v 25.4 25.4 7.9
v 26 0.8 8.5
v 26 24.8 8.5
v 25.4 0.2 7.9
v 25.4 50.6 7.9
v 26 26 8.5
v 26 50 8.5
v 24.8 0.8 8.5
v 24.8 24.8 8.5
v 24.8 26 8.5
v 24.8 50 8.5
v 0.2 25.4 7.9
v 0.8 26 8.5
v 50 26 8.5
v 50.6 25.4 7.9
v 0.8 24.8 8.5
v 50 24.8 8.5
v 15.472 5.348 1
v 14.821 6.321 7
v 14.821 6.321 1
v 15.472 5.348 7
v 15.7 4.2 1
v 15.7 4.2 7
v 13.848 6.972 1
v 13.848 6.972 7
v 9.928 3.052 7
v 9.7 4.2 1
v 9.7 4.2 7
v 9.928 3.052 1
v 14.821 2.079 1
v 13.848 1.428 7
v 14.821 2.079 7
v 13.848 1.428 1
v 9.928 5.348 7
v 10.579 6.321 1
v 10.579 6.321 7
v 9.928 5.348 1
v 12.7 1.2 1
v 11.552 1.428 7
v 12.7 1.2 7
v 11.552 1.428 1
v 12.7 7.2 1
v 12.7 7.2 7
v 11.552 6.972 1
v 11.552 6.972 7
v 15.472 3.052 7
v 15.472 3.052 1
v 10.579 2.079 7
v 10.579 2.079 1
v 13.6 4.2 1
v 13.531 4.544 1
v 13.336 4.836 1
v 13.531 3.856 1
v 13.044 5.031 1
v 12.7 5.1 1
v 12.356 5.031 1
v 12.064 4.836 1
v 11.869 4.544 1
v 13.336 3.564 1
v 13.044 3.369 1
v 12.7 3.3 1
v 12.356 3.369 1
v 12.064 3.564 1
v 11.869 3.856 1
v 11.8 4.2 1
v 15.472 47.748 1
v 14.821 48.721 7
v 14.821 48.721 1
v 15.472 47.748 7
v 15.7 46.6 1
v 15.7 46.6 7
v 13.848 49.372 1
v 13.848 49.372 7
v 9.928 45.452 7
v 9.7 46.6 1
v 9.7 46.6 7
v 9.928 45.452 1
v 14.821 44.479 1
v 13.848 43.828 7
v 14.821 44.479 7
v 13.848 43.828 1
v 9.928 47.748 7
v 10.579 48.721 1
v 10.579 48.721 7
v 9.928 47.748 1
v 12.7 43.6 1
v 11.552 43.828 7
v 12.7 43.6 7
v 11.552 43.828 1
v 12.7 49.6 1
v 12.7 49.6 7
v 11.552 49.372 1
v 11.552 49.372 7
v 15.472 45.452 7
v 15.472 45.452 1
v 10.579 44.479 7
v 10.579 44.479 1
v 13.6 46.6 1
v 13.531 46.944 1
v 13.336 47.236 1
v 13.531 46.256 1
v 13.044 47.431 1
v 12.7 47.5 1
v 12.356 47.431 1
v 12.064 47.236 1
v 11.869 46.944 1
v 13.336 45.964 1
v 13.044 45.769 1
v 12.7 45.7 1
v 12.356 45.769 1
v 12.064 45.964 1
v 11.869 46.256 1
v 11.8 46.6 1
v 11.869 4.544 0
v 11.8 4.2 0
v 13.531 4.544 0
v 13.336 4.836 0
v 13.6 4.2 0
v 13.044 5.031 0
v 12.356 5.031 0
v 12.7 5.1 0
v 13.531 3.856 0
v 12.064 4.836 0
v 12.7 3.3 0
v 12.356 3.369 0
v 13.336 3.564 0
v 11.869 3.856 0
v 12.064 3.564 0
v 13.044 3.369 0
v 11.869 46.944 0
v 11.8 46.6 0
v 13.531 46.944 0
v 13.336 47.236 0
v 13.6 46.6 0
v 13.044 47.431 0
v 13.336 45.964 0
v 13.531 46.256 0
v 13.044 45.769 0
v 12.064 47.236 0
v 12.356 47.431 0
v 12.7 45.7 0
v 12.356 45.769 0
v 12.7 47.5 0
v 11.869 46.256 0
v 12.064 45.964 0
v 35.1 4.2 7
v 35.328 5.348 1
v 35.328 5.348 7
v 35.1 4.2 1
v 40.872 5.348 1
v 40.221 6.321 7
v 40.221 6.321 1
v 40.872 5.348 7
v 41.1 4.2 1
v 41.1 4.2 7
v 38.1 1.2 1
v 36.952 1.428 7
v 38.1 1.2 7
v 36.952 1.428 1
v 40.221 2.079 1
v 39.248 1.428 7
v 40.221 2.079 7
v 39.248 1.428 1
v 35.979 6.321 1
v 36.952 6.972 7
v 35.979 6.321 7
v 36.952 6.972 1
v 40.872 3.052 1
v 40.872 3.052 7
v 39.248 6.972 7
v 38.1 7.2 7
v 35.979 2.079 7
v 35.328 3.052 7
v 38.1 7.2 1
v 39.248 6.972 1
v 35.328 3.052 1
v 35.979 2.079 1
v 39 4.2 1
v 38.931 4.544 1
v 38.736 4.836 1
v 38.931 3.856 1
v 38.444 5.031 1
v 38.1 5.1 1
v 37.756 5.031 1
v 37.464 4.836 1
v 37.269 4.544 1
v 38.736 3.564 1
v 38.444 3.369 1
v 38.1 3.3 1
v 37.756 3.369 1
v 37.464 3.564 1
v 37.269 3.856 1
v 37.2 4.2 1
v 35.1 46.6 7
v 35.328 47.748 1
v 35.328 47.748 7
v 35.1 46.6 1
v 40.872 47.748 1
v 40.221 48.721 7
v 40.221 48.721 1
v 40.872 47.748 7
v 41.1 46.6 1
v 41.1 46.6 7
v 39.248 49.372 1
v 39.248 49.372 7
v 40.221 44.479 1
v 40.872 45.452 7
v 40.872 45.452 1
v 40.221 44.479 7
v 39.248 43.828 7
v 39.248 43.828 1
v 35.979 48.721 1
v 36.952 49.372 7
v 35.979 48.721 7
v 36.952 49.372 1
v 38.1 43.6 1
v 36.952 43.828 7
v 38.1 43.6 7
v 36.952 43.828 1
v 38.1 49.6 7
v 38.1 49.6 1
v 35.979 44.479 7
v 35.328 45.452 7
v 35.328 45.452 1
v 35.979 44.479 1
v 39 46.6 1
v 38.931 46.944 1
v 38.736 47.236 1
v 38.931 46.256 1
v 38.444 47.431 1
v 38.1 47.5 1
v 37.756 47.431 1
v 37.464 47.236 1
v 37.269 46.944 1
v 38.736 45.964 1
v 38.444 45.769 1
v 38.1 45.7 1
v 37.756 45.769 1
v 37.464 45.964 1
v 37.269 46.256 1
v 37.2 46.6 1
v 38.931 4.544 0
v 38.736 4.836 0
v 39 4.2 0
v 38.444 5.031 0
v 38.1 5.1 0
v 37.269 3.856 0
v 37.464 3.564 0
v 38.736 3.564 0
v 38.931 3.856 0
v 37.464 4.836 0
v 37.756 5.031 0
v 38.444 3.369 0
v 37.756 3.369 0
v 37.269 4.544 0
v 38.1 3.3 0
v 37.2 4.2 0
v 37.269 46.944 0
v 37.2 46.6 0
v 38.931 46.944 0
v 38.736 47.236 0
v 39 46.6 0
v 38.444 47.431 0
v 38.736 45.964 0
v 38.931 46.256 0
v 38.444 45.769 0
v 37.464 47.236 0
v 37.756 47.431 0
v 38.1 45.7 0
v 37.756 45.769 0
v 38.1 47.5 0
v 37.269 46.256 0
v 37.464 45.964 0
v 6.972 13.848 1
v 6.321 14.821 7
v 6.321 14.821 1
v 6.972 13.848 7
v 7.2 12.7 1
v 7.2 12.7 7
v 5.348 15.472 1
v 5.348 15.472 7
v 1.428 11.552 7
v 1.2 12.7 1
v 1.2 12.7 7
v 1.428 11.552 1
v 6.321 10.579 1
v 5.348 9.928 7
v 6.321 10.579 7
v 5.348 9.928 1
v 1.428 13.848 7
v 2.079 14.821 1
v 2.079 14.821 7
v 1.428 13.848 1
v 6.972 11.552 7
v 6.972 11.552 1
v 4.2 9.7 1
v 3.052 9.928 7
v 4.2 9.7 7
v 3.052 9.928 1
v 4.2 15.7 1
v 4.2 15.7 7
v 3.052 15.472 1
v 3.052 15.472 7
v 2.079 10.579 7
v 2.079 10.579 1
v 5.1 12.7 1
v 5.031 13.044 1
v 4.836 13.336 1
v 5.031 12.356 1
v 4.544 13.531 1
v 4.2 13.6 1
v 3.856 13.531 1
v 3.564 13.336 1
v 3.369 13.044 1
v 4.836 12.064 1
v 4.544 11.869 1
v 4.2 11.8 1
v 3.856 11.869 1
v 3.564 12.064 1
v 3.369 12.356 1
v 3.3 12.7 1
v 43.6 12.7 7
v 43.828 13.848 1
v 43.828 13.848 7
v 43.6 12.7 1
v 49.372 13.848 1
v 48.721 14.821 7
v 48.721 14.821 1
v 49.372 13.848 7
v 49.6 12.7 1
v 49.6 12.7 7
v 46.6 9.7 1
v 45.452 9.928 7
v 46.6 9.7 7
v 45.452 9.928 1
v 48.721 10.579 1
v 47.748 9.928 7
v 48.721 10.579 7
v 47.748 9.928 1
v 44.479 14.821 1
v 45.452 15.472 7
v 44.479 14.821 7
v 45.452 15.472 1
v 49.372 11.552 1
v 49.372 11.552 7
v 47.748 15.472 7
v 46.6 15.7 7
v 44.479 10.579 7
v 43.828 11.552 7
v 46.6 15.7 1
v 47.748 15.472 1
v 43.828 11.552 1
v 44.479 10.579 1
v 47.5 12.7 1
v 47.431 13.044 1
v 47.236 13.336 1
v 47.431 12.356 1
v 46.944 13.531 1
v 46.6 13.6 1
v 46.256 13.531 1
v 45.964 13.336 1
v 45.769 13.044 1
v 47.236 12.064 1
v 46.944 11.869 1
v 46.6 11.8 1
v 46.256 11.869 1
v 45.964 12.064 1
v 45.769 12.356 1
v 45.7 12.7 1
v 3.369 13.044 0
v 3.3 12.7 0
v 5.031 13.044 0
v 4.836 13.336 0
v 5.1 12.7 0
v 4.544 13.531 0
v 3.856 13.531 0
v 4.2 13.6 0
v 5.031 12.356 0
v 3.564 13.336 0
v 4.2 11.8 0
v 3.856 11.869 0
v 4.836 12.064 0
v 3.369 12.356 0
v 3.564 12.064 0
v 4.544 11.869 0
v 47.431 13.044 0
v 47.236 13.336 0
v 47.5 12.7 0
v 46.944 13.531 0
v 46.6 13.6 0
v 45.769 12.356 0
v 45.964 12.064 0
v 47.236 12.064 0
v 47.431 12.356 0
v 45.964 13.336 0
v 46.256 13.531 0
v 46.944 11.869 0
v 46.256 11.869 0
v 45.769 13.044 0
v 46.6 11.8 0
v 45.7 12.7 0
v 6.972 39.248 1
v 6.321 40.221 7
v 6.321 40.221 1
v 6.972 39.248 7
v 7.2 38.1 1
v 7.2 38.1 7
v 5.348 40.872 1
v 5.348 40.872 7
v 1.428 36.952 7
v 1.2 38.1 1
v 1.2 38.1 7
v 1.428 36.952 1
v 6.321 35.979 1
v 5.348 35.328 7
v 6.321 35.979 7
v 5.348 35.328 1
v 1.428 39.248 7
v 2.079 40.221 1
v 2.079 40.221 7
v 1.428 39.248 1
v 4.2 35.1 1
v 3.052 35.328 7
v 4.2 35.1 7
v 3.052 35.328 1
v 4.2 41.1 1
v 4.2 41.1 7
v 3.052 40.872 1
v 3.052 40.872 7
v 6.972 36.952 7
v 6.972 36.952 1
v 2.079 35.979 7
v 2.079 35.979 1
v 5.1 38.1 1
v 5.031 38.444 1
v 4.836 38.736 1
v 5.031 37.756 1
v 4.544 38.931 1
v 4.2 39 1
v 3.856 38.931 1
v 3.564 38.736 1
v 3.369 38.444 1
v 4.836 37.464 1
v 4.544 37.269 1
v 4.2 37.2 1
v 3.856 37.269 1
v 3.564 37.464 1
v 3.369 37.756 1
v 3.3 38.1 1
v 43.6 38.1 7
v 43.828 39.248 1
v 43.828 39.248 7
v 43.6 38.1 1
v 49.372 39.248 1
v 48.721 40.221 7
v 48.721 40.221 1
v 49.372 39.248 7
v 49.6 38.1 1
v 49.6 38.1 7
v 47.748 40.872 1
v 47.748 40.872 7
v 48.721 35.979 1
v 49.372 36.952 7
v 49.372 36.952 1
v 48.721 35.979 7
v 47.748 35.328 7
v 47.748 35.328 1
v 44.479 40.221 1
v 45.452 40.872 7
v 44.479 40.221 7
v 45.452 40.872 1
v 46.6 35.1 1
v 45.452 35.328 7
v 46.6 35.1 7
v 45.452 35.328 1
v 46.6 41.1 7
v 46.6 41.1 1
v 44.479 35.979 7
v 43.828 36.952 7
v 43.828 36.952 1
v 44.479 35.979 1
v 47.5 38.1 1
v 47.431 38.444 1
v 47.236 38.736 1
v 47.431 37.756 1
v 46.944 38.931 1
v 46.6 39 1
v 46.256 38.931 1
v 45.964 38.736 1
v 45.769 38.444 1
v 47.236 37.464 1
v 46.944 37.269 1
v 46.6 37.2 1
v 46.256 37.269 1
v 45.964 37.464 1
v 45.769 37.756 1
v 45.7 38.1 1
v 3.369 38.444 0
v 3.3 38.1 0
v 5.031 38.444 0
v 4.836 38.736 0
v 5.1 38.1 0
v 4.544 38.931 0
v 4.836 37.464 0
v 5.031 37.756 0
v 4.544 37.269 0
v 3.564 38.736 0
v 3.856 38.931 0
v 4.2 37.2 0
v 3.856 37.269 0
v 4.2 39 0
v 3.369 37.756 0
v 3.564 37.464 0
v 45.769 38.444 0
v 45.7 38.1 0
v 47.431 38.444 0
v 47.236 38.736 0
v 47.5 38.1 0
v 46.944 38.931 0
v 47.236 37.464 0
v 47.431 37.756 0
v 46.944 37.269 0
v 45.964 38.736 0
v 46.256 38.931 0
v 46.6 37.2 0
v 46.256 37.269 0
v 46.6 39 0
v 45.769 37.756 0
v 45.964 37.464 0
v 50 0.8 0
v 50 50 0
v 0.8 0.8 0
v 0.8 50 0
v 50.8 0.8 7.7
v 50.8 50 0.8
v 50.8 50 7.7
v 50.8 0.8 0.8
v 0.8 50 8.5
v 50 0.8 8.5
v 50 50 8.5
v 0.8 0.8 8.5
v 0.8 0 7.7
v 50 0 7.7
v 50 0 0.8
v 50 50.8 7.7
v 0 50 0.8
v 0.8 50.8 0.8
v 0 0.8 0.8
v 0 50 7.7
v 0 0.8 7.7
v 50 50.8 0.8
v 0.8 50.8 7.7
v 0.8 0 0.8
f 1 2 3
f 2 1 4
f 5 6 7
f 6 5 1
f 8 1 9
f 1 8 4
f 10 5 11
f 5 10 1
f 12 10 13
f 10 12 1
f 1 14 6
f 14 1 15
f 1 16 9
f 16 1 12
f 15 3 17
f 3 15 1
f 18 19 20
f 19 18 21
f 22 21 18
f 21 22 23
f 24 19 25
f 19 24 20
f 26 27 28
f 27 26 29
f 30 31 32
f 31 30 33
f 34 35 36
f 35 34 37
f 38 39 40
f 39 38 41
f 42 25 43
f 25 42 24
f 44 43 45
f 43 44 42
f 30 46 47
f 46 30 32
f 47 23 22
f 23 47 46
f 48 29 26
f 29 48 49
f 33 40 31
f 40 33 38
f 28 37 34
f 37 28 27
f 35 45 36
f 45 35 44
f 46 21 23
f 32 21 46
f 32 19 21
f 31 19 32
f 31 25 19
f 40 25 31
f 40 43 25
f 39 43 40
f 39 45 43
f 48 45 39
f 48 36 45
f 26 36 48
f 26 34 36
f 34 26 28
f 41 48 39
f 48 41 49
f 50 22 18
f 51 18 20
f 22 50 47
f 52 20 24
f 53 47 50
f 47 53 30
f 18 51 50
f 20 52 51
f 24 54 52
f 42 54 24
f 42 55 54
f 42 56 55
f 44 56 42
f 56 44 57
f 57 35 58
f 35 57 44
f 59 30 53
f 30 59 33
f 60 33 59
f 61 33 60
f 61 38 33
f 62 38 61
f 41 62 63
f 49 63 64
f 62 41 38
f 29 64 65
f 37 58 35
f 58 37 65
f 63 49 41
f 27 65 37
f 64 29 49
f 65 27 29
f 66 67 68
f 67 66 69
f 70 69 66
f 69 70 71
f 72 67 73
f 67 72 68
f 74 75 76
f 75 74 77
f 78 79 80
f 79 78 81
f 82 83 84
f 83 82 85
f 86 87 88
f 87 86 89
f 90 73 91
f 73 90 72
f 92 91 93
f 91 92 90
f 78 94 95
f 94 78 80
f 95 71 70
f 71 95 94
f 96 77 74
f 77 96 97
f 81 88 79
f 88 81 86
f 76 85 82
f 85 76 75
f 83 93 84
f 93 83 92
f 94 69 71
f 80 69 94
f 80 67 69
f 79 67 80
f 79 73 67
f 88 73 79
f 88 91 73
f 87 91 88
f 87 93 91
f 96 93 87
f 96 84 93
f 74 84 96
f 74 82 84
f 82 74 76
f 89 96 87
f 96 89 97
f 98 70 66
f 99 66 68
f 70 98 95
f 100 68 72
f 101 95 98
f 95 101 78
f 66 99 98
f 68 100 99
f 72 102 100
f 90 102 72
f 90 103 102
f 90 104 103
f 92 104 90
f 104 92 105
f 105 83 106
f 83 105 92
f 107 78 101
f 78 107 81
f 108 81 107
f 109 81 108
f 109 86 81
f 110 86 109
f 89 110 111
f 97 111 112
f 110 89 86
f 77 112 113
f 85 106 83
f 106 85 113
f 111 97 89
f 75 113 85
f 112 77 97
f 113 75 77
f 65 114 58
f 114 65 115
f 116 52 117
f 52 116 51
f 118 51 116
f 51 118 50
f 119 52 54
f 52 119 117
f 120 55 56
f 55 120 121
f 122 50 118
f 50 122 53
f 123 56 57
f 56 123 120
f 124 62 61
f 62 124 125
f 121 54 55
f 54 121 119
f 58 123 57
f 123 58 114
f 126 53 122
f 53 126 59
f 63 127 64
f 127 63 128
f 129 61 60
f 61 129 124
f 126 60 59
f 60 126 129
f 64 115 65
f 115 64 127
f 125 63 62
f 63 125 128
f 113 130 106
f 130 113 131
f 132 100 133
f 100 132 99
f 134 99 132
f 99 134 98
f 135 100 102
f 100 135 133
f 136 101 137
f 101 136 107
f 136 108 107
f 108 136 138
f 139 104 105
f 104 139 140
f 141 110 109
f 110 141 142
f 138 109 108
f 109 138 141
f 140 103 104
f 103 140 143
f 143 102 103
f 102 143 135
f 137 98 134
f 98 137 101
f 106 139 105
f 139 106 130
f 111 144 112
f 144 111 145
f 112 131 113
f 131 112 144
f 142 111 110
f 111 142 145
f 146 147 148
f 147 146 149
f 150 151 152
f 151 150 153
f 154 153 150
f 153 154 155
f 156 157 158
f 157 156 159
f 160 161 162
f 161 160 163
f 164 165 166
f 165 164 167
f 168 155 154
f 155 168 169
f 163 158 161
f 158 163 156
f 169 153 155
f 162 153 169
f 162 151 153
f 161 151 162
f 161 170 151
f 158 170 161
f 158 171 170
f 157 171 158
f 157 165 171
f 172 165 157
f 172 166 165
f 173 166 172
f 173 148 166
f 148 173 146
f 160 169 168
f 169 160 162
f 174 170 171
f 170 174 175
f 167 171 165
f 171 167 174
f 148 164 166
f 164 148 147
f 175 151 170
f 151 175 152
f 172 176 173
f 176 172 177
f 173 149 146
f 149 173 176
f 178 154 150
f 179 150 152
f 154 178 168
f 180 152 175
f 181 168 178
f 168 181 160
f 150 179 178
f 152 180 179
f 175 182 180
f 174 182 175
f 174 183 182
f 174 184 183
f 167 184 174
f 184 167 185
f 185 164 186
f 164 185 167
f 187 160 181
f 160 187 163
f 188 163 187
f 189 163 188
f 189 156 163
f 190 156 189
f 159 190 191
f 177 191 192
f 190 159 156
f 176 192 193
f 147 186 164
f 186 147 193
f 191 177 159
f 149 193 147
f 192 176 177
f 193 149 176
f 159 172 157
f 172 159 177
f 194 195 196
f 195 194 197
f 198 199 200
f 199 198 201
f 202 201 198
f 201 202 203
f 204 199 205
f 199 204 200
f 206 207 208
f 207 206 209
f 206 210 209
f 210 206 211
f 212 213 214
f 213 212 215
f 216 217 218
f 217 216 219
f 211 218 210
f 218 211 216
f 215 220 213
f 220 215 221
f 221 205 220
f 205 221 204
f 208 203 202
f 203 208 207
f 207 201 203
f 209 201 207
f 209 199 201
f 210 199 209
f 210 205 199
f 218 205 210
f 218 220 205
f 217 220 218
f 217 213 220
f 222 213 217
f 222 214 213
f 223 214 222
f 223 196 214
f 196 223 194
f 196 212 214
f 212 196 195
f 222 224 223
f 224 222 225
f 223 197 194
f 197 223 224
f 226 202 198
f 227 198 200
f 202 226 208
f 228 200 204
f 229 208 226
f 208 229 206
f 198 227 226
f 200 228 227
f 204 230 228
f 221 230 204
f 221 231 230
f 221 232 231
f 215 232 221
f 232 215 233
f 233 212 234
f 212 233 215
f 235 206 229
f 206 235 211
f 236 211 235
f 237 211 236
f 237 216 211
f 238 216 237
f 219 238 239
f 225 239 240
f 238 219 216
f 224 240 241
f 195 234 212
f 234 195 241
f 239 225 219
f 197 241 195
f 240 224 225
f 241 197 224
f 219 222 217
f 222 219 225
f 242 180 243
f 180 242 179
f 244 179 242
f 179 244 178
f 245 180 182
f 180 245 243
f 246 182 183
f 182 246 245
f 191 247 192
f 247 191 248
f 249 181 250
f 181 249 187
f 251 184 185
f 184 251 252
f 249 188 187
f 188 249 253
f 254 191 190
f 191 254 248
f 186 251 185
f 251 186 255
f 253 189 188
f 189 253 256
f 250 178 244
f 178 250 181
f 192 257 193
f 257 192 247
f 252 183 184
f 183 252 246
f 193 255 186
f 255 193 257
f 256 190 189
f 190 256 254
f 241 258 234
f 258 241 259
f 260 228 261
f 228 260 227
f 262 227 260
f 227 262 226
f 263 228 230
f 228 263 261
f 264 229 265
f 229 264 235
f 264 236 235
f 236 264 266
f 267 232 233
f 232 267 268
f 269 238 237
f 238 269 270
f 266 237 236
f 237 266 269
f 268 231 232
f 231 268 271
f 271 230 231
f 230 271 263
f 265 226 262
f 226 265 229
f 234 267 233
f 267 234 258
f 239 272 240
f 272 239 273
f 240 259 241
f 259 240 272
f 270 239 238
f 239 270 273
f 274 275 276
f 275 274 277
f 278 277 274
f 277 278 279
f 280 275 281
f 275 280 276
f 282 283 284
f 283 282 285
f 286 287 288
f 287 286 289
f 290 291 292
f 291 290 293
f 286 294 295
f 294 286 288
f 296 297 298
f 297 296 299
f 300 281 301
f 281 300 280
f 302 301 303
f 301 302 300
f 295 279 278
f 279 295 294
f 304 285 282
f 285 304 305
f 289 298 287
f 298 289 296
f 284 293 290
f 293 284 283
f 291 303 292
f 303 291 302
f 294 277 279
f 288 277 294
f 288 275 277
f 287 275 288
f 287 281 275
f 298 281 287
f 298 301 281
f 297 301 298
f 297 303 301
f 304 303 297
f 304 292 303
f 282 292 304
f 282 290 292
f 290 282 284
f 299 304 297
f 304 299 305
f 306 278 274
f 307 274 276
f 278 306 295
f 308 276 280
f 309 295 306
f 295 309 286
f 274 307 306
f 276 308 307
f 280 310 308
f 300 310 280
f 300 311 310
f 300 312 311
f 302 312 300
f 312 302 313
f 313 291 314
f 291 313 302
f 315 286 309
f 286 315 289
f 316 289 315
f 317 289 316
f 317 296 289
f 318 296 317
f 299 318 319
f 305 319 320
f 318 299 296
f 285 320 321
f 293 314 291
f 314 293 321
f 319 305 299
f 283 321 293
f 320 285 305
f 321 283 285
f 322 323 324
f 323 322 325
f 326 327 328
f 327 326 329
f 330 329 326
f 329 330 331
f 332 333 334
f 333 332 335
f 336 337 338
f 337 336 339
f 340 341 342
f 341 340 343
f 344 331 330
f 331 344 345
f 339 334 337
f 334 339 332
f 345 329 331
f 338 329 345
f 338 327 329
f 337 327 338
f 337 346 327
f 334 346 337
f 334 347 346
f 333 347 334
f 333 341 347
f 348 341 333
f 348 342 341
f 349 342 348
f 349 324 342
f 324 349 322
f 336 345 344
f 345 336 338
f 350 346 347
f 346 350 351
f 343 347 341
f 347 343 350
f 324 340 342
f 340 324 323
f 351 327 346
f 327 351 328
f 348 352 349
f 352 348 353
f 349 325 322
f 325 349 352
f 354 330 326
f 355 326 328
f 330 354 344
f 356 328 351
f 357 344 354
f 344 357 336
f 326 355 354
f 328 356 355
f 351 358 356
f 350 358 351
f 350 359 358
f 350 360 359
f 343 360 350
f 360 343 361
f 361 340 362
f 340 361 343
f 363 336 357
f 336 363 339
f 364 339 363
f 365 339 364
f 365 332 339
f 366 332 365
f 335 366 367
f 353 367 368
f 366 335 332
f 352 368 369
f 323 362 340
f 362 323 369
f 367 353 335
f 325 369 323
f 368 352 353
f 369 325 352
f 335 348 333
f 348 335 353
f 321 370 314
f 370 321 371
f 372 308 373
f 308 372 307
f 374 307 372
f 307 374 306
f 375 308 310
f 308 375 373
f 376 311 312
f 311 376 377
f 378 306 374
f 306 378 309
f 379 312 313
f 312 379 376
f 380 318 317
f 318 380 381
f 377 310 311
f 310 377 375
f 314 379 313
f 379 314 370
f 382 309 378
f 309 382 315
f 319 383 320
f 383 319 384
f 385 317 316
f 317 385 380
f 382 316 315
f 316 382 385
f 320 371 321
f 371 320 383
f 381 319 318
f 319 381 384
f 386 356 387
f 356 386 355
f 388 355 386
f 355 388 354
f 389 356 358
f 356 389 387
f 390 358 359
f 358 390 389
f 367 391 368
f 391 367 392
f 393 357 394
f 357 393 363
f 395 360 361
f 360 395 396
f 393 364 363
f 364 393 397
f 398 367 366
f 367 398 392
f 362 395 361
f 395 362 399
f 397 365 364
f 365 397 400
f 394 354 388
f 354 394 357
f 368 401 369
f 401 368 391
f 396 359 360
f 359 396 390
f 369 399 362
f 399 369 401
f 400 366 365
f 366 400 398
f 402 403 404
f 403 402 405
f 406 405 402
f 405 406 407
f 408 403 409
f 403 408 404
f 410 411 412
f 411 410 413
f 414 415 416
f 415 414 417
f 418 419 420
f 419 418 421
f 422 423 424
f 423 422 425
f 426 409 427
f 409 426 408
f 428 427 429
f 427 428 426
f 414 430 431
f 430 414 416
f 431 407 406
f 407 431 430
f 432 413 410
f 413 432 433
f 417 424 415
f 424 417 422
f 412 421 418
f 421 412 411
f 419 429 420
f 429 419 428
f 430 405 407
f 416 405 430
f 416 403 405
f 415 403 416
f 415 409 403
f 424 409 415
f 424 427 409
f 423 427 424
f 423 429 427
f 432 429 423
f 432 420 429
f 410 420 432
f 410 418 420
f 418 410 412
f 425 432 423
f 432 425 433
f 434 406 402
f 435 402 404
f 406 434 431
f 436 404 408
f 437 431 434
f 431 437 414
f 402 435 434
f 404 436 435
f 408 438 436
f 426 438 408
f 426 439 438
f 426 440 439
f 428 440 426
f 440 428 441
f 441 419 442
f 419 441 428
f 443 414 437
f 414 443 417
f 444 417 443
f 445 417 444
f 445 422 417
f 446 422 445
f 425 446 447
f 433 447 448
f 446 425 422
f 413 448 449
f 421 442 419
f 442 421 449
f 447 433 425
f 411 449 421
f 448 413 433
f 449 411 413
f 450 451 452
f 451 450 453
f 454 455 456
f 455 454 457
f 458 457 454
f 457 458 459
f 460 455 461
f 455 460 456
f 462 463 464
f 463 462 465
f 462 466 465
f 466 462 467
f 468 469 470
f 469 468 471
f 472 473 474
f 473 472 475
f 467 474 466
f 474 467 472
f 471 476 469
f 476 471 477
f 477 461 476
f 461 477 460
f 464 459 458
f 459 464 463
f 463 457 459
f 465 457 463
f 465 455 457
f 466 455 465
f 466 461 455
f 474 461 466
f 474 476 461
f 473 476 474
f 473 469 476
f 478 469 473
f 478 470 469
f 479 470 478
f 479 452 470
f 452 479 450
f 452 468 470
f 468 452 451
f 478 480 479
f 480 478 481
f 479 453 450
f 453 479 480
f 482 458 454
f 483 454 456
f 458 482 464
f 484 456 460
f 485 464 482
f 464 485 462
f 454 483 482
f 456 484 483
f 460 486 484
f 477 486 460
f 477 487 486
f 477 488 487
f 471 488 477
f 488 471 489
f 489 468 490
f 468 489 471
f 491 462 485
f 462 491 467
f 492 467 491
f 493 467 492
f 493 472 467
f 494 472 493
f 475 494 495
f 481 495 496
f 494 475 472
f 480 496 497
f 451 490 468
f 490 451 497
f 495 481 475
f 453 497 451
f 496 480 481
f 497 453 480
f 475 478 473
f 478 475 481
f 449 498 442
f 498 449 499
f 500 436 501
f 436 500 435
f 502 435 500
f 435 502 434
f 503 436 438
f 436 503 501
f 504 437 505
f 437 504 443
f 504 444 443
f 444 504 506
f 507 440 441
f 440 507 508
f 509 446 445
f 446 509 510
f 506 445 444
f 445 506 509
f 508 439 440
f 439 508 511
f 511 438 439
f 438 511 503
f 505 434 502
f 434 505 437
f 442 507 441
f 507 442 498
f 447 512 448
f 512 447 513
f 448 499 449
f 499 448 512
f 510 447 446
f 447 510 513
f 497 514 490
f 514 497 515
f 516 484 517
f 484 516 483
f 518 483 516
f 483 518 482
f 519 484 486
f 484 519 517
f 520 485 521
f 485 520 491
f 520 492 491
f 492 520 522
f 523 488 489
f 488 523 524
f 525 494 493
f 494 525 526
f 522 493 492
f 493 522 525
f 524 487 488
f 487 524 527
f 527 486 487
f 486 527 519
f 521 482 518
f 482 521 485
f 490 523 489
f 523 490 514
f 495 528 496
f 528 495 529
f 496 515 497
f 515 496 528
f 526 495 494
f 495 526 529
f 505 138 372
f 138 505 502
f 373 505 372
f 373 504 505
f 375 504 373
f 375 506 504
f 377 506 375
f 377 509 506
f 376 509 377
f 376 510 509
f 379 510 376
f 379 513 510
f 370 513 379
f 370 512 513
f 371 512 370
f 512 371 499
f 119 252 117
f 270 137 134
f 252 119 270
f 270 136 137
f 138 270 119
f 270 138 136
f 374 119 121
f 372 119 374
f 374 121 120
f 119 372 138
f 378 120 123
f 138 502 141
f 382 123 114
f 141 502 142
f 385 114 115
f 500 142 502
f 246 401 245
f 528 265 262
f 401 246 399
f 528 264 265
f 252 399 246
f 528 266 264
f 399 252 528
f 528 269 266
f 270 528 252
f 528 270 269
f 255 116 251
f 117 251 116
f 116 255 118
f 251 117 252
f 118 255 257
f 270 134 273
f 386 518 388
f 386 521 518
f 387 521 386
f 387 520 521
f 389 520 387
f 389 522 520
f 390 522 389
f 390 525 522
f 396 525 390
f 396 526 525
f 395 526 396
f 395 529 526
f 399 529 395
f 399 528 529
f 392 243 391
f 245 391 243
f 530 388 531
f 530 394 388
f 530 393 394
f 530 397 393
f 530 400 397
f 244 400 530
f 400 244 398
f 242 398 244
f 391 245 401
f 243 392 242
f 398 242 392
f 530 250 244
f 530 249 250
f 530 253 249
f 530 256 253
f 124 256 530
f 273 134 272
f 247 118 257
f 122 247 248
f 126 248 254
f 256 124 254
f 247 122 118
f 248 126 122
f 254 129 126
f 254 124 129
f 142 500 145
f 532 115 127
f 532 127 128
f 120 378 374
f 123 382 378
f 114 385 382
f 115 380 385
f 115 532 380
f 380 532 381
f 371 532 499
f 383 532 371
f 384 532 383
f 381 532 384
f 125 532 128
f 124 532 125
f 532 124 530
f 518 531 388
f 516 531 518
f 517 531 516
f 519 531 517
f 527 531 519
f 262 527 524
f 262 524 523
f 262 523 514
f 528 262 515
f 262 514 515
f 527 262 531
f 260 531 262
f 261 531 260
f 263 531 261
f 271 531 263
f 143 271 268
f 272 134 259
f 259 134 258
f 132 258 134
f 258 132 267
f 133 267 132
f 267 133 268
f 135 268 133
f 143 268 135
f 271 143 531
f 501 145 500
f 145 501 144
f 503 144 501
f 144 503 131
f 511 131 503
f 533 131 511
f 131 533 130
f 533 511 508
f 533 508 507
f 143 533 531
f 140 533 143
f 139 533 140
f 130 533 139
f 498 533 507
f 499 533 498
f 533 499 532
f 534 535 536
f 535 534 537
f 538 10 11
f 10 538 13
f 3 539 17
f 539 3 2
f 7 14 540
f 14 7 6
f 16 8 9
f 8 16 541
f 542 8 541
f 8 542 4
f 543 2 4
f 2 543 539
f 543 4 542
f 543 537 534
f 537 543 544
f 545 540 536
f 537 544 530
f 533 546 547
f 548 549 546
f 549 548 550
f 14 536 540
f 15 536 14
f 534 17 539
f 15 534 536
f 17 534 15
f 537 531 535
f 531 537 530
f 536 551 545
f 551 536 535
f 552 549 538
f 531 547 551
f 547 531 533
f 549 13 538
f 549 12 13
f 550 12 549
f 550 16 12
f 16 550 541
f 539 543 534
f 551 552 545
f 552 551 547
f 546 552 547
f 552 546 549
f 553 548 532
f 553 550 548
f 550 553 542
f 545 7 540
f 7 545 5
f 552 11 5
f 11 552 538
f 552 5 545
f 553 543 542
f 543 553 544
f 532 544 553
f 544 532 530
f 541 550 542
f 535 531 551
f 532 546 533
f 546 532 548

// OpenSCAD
floor_thick=8.5;
tilex=2;
tiley=2;
basis=25.4;
groove=.6;
bevel=.8;

damage=1;
damage_w=.15;
layer_t=.2;
ep=0.01;
print_wall=1.2;

magnet_r=6/2;

//floor

module floor_plate()
{
    translate([tilex*basis/2,tiley*basis/2,floor_thick/2])hull()
    {
        cube([tilex*basis-bevel*2,tiley*basis-bevel*2,floor_thick],center=true);
        cube([tilex*basis-bevel*2,tiley*basis,floor_thick-bevel*2],center=true);
        cube([tilex*basis,tiley*basis-bevel*2,floor_thick-bevel*2],center=true);
    }
}
module grids()
{
    for (ii=[0:tilex])
    {
        translate([ii*basis,tiley*basis/2,floor_thick])rotate([0,45,0])cube([groove*sqrt(2),tiley*basis*2,groove*sqrt(2)],center=true);
    }
    for (ii=[0:tiley])
    {
        translate([tilex*basis/2,ii*basis,floor_thick])rotate([45,0,0])cube([tilex*basis*2,groove*sqrt(2),groove*sqrt(2)],center=true);
    }
}
module mag_holes()
{
    for (ii=[0:tilex-1])
    {
        translate([ii*basis+basis*.5,magnet_r+print_wall,1])cylinder(r=magnet_r,h=magnet_r*2,$fn=16);
        translate([ii*basis+basis*.5,basis*tiley-(magnet_r+print_wall),1])cylinder(r=magnet_r,h=magnet_r*2,$fn=16);
        //witness holes
        translate([ii*basis+basis*.5,magnet_r+print_wall,1])cylinder(r=.9,h=floor_thick,center=true,$fn=16);
        translate([ii*basis+basis*.5,basis*tiley-(magnet_r+print_wall),1])cylinder(r=.9,h=floor_thick,center=true,$fn=16);
    }
    for (ii=[0:tiley-1])
    {
        translate([magnet_r+print_wall,ii*basis+basis*.5,1])cylinder(r=magnet_r,h=magnet_r*2,$fn=16);
        translate([basis*tilex-(magnet_r+print_wall),ii*basis+basis*.5,1])cylinder(r=magnet_r,h=magnet_r*2,$fn=16);
        //witness holes
        translate([magnet_r+print_wall,ii*basis+basis*.5,1])cylinder(r=.9,h=floor_thick,center=true,$fn=16);
        translate([basis*tilex-(magnet_r+print_wall),ii*basis+basis*.5,1])cylinder(r=.9,h=floor_thick,center=true,$fn=16);
    }
}
difference()
{
    floor_plate();
    
    if (damage>0)
    {
        for (ii=[1:damage])
        {
            shapenum = floor(rands(0,16,1)[0])+1;
            angle=floor(rands(0,360,1)[0])+1;
            xx=basis*(rands(0,tilex,1)[0]);
            yy=basis*(rands(0,tiley,1)[0]);
            translate([xx,yy,0])rotate([0,0,angle])translate([0,0,floor_thick])blemish(shapenum);
        }
    }
    grids();
    mag_holes();
}


module selectshape(shapenum)
{
    
    if (shapenum==1){ shape01(); }
    if (shapenum==2){ shape02(); }
    if (shapenum==3){ shape03(); }
    if (shapenum==4){ shape04(); }
    if (shapenum==5){ shape05(); }
    if (shapenum==6){ shape06(); }
    if (shapenum==7){ shape07(); }
    if (shapenum==8){ shape08(); }
    if (shapenum==9){ shape09(); }
    if (shapenum==10){ shape10(); }
    if (shapenum==11){ shape11(); }
    if (shapenum==12){ shape12(); }
    if (shapenum==13){ shape13(); }
    if (shapenum==14){ shape14(); }
    if (shapenum==15){ shape15(); }
    if (shapenum==16){ shape16(); }
}
module blemish(shapenum)
{
    $fn=20;
    translate([0,0,-5*layer_t])linear_extrude(height=layer_t+ep)selectshape(shapenum);
    translate([0,0,-4*layer_t])linear_extrude(height=layer_t+ep)offset(r=damage_w*1)selectshape(shapenum);
    translate([0,0,-3*layer_t])linear_extrude(height=layer_t+ep)offset(r=damage_w*2)selectshape(shapenum);
    translate([0,0,-2*layer_t])linear_extrude(height=layer_t+ep)offset(r=damage_w*3)selectshape(shapenum);
    translate([0,0,-1*layer_t])linear_extrude(height=layer_t+ep)offset(r=damage_w*4)selectshape(shapenum);
}
module shape01()
{
    translate([-3,-2])scale(.8)import("blemish/shape001.dxf");
}
module shape02()
{
    translate([-3,-2])scale(.8)import("blemish/shape002.dxf");
}
module shape03()
{
    translate([-3,-2,0])scale(.8)import("blemish/shape003.dxf");
}
module shape04()
{
    translate([-14,-18,0])scale(.8)import("blemish/shape004.dxf");
}
module shape05()
{
    translate([-13,-10,0])scale(.8)import("blemish/shape005.dxf");
}
module shape06()
{
    translate([-2,-4,0])scale(.32)import("blemish/shape006.dxf");
}
module shape07()
{
    translate([-9,-9,0])scale(.3)import("blemish/shape007.dxf");
}
module shape08()
{
    translate([-6,-12,0])scale(.6)import("blemish/shape008.dxf");
}
module shape09()
{
    translate([-2,-2,0])scale(.2)import("blemish/shape009.dxf");
}
module shape10()
{
    translate([-1,-3,0])scale(.1)import("blemish/shape010.dxf");
}
module shape11()
{
    translate([-2,-4,0])scale(.3)import("blemish/shape011.dxf");
}
module shape12()
{
    translate([-6,-2,0])scale(.6)import("blemish/shape012.dxf");
}
module shape13()
{
    translate([-9,-14,0])scale(.7)import("blemish/shape013.dxf");
}
module shape14()
{
    translate([-0.5,-1,0])scale(.1)import("blemish/shape014.dxf");
}
module shape15()
{
    translate([-.5,-.5,0])scale(.1)import("blemish/shape015.dxf");
}
module shape16()
{
    translate([-6,-6,0])scale(.5)import("blemish/shape016.dxf");
}
